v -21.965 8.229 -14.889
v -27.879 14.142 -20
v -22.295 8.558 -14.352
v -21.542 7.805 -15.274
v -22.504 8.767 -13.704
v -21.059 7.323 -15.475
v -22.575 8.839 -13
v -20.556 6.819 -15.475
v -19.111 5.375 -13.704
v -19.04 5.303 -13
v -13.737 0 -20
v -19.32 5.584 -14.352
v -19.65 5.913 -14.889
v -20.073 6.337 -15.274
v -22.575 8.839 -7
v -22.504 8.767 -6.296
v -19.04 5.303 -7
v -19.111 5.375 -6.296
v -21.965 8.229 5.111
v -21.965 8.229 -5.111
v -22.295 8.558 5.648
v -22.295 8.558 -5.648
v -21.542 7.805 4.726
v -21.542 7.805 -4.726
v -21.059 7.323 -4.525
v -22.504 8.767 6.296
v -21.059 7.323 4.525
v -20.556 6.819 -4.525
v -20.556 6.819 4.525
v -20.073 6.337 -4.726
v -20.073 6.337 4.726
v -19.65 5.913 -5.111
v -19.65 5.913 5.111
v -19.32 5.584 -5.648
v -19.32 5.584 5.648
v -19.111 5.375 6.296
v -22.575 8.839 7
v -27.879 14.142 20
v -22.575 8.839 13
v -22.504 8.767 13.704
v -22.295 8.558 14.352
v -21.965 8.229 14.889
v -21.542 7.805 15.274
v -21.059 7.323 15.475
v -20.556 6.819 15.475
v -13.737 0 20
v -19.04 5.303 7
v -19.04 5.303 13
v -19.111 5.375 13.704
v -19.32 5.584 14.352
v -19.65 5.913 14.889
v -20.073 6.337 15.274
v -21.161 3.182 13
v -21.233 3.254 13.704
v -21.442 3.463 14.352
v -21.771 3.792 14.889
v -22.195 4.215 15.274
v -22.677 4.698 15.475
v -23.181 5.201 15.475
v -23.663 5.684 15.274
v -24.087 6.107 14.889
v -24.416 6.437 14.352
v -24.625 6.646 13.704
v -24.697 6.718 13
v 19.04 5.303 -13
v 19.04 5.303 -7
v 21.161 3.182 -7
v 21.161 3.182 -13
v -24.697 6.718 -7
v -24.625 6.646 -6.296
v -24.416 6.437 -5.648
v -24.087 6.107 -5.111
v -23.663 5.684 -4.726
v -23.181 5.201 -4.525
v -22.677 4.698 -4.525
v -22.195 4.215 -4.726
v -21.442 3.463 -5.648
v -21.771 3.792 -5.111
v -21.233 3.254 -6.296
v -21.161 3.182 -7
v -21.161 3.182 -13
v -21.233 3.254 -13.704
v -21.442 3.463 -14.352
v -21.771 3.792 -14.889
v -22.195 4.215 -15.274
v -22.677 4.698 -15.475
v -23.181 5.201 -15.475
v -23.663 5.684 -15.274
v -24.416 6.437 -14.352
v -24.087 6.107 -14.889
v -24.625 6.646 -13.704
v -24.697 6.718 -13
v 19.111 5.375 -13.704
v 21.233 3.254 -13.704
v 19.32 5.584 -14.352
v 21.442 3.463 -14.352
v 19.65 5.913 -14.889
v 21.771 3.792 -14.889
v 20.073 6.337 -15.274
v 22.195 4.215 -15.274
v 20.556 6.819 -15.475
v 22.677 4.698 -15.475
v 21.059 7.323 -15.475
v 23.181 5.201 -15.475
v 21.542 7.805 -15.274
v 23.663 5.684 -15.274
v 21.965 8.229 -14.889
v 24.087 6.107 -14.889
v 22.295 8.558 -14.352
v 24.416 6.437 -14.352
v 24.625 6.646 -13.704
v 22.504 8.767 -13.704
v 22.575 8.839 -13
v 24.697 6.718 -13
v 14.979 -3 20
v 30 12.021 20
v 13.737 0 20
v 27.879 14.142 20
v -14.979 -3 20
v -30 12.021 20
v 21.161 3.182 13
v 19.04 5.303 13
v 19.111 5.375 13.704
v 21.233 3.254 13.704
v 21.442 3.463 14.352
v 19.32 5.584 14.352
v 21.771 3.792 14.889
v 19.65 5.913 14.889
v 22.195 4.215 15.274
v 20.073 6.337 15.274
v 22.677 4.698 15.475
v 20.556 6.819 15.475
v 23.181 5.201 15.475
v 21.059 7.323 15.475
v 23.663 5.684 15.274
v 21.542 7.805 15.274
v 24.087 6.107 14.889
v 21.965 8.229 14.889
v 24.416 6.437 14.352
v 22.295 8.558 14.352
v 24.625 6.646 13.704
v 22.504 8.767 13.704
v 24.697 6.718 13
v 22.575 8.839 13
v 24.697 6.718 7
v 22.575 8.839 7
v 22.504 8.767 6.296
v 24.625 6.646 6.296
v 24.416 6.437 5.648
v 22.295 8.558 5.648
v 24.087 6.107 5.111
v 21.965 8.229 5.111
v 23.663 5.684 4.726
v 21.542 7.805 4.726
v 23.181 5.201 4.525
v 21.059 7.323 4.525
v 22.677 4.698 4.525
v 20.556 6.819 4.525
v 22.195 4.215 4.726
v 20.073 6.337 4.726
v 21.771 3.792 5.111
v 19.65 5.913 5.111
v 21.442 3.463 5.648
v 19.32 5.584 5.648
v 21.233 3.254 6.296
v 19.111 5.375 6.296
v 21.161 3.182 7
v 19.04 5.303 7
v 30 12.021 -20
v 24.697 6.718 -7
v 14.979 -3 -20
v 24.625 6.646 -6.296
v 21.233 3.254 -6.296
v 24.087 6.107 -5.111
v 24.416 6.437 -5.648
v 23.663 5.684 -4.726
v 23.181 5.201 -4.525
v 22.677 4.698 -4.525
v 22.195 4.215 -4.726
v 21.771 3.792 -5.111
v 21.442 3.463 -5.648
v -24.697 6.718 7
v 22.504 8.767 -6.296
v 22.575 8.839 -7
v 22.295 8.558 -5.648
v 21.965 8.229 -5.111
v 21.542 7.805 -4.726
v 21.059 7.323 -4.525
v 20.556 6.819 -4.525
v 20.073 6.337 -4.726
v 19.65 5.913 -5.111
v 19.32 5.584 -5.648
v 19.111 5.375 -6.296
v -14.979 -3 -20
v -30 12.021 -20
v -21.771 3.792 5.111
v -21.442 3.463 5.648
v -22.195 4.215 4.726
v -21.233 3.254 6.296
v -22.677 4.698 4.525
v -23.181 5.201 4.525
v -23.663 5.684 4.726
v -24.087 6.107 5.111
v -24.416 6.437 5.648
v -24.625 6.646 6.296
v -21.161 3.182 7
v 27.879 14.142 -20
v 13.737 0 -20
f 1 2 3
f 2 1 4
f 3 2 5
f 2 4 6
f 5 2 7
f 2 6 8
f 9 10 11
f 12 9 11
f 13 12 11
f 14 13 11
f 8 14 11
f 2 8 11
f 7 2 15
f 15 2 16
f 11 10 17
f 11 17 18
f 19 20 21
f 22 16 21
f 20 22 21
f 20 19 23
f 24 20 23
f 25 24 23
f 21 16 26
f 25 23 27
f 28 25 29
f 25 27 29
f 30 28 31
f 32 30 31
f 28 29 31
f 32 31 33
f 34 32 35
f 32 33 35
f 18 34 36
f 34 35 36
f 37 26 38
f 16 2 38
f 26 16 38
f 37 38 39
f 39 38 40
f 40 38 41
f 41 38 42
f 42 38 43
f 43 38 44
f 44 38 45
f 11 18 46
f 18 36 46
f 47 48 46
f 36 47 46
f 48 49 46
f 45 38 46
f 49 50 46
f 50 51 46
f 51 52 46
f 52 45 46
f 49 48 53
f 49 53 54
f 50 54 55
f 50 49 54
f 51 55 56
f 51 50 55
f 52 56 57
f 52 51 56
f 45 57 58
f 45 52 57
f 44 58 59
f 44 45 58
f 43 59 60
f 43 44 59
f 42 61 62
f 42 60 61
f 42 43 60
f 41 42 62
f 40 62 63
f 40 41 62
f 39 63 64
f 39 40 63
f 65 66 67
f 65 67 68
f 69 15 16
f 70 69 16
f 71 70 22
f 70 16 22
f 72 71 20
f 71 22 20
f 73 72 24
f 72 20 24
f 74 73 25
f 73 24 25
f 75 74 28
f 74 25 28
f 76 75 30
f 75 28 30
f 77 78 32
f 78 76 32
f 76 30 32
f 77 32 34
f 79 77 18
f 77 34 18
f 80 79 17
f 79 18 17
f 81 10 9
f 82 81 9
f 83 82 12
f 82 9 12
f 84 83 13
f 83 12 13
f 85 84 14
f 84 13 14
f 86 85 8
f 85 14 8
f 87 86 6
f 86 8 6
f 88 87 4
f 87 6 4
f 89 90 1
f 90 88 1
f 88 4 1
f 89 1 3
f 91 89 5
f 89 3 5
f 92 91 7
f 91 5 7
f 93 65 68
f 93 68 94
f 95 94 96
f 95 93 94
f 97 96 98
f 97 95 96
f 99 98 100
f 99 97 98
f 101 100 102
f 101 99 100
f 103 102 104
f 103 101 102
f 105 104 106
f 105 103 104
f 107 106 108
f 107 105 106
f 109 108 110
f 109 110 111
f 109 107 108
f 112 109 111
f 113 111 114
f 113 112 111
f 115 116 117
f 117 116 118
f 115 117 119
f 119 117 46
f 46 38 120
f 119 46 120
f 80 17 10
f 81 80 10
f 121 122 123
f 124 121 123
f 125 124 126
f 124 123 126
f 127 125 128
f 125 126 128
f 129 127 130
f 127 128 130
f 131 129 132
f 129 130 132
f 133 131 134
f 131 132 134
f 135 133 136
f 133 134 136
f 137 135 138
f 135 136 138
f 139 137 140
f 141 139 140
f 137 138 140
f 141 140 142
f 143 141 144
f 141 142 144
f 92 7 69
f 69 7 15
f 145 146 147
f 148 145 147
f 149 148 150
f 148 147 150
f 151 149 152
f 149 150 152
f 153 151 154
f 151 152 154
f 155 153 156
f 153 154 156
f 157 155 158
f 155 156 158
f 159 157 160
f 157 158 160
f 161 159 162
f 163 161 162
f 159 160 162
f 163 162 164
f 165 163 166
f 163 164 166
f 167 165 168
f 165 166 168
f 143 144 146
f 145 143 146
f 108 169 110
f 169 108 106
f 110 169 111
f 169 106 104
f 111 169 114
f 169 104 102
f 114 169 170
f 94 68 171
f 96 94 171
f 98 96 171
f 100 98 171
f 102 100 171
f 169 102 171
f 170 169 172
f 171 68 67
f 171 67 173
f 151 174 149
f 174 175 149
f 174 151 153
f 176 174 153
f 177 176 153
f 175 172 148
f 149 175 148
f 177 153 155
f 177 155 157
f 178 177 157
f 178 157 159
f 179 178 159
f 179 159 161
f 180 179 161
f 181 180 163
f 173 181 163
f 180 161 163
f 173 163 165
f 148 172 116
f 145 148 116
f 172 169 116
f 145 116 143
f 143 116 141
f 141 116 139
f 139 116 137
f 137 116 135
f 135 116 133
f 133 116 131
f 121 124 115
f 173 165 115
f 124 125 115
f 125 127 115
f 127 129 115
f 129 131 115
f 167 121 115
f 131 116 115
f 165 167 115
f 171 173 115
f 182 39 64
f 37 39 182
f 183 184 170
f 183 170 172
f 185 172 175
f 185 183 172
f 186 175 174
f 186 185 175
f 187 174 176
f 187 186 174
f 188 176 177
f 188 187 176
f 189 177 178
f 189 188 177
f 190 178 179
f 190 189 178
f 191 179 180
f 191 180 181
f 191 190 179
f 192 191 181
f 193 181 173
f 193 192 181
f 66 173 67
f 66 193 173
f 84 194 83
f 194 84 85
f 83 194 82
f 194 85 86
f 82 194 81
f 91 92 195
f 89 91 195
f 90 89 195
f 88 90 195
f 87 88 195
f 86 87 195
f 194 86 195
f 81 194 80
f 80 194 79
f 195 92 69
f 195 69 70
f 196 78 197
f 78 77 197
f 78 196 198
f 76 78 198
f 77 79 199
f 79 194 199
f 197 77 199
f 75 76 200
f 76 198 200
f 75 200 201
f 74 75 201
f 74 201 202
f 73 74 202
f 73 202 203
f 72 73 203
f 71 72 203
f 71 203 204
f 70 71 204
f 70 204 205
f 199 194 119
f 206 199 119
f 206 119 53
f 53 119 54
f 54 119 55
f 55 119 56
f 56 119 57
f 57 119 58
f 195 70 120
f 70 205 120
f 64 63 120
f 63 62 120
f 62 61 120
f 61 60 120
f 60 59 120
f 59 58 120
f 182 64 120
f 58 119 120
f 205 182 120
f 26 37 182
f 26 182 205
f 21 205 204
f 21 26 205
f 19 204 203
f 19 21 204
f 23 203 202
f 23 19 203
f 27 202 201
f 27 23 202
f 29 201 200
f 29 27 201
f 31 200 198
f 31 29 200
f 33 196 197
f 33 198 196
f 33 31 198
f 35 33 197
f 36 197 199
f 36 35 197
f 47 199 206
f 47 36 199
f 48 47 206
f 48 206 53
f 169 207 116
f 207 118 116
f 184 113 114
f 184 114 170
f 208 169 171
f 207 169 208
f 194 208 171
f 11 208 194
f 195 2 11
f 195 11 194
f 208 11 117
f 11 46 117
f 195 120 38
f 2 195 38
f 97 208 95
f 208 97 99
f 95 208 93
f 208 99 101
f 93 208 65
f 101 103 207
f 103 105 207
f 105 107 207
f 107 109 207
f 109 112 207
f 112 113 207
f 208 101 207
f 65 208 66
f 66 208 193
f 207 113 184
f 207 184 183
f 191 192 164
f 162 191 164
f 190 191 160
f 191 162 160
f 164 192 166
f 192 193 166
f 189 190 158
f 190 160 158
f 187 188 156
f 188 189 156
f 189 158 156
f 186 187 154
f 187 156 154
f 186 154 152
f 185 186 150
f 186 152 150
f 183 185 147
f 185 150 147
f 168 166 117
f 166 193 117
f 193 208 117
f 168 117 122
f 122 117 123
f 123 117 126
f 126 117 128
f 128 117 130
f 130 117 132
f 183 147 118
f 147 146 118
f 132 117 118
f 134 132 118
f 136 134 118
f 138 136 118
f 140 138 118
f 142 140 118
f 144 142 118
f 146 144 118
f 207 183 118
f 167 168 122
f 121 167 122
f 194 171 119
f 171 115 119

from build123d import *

# Parameters (mm, degrees)
EXTRUDE_1_DEPTH     = 20
CUT_EXTRUDE_1_DEPTH = 14.621320344


with BuildPart() as part:
    # Эскиз1 → Вытянуть-Тонкостенный1 (new body)
    with BuildSketch(Plane.XY):
        Polygon((-27.878679656, 14.142135624), (-13.736544033, 0), (13.736544033, 0), (27.878679656, 14.142135624), (30, 12.02081528), (14.97918472, -3), (-14.97918472, -3), (-30, 12.02081528), align=None)
    extrude(amount=EXTRUDE_1_DEPTH)

    # Эскиз2 → Вырез-Вытянуть1 (cut, through all)
    with BuildSketch(Plane(origin=(-6.868272016, -6.868272016, 0), x_dir=(0, 0, -1), z_dir=(0.707106781, 0.707106781, 0))):
        with BuildLine():
            Line((-7, 17.213203436), (-13, 17.213203436))
            ThreePointArc((-13, 17.213203436), (-15.5, 19.713203436), (-13, 22.213203436))
            Line((-13, 22.213203436), (-7, 22.213203436))
            ThreePointArc((-7, 22.213203436), (-4.5, 19.713203436), (-7, 17.213203436))
        make_face()
    cut_extrude_1 = extrude(amount=-CUT_EXTRUDE_1_DEPTH, mode=Mode.SUBTRACT)

    # Зеркальное отражение1: Вырез-Вытянуть1 across plane
    add(cut_extrude_1.mirror(Plane(origin=(0, 0, 0), x_dir=(0, 0, 1), z_dir=(1, 0, 0))), mode=Mode.SUBTRACT)

    # Зеркальное отражение2: part across plane


with BuildPart() as part_1:
    add(part.part)
    add(part.part.mirror(Plane(origin=(0, 0, 0), x_dir=(1, 0, 0), z_dir=(0, 0, -1))))


solid = part_1.part
